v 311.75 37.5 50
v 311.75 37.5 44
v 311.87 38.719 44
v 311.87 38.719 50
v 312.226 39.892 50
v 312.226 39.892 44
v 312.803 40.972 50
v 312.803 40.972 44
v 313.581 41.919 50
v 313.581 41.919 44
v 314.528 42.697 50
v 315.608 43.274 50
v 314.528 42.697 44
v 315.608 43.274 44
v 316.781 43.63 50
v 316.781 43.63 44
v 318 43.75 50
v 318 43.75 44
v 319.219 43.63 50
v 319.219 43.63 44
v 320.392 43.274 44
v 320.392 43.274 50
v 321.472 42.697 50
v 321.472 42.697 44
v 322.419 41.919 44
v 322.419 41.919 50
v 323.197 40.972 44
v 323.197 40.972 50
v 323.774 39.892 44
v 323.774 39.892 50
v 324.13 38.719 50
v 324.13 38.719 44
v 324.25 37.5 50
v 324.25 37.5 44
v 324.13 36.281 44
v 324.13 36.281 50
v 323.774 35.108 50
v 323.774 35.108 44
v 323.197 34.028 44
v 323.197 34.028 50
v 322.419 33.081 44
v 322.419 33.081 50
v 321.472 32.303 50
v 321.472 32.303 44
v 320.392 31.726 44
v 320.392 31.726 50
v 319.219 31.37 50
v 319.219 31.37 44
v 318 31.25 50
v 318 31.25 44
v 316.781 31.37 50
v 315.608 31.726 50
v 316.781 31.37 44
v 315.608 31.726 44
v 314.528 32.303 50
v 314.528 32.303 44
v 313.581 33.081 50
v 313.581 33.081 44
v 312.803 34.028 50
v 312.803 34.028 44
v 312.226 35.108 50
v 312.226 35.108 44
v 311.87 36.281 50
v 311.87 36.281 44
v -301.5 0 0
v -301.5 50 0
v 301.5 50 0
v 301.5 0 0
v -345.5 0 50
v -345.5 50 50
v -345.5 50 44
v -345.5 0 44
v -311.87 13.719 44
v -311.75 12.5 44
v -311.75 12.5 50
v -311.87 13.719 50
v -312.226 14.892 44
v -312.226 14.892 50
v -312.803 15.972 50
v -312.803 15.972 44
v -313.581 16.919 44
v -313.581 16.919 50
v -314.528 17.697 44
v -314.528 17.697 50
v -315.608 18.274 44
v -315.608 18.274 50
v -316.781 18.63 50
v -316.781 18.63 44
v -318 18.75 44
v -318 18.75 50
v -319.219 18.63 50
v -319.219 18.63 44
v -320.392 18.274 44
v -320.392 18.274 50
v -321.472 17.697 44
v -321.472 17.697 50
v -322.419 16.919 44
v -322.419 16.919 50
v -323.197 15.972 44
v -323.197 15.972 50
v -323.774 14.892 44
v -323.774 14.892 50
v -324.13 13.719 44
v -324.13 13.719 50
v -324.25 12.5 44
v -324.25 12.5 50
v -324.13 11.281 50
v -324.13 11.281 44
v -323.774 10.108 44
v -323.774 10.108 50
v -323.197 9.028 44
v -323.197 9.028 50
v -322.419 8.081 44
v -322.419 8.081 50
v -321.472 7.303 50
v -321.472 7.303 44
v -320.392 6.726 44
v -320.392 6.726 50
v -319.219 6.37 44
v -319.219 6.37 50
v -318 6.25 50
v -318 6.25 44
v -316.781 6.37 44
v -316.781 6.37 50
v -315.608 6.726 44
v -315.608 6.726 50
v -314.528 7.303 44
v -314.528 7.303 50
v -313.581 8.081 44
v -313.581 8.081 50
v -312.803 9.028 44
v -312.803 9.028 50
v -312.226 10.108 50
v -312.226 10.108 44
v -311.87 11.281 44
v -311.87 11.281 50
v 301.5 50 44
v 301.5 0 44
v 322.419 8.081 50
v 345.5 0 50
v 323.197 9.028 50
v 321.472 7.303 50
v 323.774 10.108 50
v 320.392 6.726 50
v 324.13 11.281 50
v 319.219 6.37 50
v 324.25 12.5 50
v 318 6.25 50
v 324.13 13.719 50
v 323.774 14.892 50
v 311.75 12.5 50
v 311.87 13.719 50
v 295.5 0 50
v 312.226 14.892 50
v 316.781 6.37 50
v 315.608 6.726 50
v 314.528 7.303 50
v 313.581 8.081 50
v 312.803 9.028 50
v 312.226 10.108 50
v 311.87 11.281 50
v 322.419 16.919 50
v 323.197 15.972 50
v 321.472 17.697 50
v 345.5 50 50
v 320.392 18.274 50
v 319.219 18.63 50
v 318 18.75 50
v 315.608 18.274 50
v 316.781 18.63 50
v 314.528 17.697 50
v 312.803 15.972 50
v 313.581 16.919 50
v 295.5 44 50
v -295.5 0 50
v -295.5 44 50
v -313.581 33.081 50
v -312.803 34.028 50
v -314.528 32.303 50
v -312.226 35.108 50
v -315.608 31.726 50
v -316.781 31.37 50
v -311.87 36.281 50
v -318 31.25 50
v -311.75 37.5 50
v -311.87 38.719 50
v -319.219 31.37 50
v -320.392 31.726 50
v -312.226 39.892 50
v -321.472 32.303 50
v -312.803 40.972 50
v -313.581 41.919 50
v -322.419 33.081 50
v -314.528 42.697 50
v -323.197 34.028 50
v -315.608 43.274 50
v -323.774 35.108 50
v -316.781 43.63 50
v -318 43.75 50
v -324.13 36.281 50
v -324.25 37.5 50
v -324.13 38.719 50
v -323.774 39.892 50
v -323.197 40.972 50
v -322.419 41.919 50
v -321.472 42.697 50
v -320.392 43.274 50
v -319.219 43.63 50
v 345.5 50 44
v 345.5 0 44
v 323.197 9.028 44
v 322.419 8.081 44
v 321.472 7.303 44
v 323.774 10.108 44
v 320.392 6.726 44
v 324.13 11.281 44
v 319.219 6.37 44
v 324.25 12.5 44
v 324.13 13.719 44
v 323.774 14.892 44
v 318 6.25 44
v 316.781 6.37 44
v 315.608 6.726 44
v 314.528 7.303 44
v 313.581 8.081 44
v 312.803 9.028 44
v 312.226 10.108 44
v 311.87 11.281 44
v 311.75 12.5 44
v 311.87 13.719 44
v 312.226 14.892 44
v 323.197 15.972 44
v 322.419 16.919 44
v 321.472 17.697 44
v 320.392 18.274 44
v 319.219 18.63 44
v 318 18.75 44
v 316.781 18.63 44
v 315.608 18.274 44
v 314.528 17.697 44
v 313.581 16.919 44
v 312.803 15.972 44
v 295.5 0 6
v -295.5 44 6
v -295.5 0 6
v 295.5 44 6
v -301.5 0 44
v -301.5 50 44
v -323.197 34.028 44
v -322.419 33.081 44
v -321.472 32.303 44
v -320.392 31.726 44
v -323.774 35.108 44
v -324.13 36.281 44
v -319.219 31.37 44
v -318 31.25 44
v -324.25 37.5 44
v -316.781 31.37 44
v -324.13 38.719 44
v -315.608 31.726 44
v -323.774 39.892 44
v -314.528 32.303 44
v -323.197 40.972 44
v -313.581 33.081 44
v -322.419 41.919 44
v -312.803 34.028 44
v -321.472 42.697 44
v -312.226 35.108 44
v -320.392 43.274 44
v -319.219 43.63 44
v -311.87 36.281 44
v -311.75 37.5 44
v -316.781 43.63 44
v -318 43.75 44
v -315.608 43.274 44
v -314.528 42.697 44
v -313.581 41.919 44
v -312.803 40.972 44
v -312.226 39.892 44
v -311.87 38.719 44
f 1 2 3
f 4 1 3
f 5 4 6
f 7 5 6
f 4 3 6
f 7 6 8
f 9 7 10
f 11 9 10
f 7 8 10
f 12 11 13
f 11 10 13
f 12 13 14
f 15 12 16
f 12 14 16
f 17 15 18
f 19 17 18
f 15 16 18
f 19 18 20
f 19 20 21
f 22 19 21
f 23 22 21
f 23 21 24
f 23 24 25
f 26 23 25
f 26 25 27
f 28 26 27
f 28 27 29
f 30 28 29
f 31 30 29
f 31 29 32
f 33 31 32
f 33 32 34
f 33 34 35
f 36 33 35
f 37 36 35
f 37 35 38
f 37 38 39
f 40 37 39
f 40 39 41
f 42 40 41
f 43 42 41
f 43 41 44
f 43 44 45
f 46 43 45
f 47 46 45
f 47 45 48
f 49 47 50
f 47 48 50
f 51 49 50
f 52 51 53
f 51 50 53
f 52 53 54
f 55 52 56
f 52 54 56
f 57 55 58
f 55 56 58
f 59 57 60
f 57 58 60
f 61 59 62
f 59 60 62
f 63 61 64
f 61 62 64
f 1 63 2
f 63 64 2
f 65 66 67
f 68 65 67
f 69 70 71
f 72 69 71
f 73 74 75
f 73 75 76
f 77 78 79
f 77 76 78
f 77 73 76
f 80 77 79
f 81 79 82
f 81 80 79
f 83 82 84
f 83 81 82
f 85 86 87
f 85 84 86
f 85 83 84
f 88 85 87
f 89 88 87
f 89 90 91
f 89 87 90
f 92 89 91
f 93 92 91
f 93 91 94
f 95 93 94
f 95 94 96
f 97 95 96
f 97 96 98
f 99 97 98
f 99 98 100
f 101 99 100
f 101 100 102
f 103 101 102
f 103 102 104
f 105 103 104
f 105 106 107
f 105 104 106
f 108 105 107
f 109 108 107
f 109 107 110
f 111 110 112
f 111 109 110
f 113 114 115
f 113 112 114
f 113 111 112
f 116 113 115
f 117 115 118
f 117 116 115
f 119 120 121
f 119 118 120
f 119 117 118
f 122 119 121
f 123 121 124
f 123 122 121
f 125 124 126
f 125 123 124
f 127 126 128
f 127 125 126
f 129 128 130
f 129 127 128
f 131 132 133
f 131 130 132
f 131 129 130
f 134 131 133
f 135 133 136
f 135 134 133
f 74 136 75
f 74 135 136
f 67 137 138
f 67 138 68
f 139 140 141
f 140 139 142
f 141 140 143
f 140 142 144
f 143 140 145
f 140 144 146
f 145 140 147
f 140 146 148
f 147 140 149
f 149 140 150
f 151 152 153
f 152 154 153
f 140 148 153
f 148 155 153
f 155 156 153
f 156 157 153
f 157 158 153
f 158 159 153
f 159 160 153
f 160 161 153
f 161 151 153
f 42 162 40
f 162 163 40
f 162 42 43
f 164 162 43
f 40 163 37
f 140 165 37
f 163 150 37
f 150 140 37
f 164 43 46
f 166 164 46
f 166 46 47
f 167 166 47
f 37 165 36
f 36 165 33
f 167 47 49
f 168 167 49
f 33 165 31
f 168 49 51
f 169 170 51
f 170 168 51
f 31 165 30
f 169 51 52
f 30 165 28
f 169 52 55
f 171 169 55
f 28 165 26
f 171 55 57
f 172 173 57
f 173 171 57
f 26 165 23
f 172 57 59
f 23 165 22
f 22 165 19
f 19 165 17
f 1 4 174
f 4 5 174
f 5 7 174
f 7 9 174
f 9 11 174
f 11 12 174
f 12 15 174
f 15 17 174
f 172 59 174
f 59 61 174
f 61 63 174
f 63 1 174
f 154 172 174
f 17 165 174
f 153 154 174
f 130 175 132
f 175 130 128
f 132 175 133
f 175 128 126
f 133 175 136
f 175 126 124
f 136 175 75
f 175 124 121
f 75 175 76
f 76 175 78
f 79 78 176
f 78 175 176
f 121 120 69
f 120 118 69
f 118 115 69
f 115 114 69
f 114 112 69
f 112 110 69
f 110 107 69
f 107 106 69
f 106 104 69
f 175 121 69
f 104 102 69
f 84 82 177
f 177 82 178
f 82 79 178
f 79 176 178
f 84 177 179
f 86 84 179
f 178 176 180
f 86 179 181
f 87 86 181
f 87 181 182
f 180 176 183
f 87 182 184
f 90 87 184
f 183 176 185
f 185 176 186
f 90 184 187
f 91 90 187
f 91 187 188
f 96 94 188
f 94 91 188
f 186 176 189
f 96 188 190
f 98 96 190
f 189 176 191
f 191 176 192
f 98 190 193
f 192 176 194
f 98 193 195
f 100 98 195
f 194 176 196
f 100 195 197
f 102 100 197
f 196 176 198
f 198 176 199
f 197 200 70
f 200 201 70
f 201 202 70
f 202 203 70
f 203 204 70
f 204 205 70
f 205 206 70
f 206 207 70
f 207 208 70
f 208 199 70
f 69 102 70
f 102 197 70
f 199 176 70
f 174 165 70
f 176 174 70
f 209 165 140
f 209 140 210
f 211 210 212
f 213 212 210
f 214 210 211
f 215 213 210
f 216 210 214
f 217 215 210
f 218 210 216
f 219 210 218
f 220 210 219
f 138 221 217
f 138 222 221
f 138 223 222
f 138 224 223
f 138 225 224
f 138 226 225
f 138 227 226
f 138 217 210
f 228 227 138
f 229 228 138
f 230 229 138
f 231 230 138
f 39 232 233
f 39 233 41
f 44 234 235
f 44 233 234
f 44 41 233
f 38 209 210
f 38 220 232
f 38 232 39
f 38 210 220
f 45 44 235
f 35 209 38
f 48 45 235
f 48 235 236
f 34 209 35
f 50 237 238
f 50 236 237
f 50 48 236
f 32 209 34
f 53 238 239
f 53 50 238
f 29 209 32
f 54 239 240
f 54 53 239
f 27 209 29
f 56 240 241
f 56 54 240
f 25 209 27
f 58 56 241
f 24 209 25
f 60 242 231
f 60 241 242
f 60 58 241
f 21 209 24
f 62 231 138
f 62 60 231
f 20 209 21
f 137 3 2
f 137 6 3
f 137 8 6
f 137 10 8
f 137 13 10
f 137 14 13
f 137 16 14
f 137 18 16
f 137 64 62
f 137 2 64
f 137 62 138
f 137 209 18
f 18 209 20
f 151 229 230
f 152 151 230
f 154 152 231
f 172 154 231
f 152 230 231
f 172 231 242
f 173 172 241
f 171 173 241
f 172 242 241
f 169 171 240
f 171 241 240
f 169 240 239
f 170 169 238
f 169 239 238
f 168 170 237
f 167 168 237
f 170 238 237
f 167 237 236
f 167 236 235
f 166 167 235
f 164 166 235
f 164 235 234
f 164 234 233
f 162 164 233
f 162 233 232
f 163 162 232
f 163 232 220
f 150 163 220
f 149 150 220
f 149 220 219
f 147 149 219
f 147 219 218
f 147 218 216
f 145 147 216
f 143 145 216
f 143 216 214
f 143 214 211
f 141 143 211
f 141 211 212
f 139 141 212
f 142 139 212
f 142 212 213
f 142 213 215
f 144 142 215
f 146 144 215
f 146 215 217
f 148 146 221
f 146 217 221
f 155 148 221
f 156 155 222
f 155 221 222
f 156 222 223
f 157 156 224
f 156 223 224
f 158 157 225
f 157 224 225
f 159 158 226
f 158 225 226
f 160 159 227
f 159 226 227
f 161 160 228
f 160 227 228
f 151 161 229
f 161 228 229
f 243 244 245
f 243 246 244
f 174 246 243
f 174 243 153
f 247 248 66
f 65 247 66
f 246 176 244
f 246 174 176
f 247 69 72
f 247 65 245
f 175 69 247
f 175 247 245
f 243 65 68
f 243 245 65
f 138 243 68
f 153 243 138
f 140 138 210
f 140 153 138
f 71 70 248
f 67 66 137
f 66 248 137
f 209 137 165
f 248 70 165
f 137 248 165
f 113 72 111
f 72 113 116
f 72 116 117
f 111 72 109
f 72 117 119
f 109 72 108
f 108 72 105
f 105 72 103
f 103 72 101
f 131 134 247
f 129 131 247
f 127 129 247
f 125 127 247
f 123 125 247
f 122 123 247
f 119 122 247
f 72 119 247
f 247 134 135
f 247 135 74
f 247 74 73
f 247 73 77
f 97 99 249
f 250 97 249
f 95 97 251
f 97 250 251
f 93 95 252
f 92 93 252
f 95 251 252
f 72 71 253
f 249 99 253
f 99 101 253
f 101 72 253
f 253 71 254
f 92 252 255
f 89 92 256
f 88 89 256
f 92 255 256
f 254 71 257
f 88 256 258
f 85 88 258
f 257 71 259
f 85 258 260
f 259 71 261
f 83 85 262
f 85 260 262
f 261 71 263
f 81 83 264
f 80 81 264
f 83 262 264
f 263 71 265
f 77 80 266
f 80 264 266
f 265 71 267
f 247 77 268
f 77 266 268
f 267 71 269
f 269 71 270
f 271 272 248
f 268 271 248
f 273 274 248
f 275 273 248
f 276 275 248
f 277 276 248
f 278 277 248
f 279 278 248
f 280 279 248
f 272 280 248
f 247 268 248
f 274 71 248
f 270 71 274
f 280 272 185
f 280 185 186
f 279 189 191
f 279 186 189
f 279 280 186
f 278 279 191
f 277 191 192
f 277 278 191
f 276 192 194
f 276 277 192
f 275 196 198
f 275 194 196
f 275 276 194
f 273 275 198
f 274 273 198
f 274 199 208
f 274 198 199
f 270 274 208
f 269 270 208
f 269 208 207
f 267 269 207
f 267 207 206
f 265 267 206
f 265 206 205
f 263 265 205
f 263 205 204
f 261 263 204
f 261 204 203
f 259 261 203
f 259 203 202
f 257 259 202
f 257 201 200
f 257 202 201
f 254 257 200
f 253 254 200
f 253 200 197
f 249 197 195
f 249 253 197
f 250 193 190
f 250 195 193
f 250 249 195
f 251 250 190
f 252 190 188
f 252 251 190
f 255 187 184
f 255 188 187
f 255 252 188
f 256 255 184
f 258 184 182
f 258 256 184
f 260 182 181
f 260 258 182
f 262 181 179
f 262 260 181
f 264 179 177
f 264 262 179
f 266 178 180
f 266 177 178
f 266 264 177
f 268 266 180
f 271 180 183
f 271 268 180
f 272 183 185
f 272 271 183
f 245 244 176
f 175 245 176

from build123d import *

# Parameters (mm, degrees)
F1_DEPTH = 295.5
F3_DEPTH = 50
F5_D     = 12.5


# Not quite as in the source:
# - a pattern or mirror of a feature is missing from the dataset's text; its kind, count and spacing are read off the source's solid


with BuildPart() as f1:
    # F0 (on Right) → F1 (new body, symmetric)
    with BuildSketch(Plane.YZ):
        Polygon((0, 6), (0, 0), (50, 0), (50, 50), (44, 50), (44, 6), align=None)
    extrude(amount=F1_DEPTH, both=True)

    # F2 (on face) → F3 (join)
    with BuildSketch(Plane(origin=(0, 50, 0), x_dir=(-1, 0, 0), z_dir=(0, 1, 0))):
        Polygon((-301.5, 0), (-295.5, 0), (-295.5, 50), (-345.5, 50), (-345.5, 44), (-301.5, 44), align=None)
    f3 = extrude(amount=-F3_DEPTH)

    # F3_copies: F3 across plane
    add(f3.mirror(Plane(origin=(0, 0, 0), x_dir=(0, 0, -1), z_dir=(-1, 0, 0))))

    # F5 (through all)
    with Locations(Plane.XY.offset(50)):
        with Locations((318, 37.5), (318, 12.5)):
            f5 = Hole(F5_D / 2)

    # F5_copies: F5 across plane
    add(f5.mirror(Plane(origin=(0, 0, 0), x_dir=(0, 0, -1), z_dir=(-1, 0, 0))), mode=Mode.SUBTRACT)


solid = f1.part
